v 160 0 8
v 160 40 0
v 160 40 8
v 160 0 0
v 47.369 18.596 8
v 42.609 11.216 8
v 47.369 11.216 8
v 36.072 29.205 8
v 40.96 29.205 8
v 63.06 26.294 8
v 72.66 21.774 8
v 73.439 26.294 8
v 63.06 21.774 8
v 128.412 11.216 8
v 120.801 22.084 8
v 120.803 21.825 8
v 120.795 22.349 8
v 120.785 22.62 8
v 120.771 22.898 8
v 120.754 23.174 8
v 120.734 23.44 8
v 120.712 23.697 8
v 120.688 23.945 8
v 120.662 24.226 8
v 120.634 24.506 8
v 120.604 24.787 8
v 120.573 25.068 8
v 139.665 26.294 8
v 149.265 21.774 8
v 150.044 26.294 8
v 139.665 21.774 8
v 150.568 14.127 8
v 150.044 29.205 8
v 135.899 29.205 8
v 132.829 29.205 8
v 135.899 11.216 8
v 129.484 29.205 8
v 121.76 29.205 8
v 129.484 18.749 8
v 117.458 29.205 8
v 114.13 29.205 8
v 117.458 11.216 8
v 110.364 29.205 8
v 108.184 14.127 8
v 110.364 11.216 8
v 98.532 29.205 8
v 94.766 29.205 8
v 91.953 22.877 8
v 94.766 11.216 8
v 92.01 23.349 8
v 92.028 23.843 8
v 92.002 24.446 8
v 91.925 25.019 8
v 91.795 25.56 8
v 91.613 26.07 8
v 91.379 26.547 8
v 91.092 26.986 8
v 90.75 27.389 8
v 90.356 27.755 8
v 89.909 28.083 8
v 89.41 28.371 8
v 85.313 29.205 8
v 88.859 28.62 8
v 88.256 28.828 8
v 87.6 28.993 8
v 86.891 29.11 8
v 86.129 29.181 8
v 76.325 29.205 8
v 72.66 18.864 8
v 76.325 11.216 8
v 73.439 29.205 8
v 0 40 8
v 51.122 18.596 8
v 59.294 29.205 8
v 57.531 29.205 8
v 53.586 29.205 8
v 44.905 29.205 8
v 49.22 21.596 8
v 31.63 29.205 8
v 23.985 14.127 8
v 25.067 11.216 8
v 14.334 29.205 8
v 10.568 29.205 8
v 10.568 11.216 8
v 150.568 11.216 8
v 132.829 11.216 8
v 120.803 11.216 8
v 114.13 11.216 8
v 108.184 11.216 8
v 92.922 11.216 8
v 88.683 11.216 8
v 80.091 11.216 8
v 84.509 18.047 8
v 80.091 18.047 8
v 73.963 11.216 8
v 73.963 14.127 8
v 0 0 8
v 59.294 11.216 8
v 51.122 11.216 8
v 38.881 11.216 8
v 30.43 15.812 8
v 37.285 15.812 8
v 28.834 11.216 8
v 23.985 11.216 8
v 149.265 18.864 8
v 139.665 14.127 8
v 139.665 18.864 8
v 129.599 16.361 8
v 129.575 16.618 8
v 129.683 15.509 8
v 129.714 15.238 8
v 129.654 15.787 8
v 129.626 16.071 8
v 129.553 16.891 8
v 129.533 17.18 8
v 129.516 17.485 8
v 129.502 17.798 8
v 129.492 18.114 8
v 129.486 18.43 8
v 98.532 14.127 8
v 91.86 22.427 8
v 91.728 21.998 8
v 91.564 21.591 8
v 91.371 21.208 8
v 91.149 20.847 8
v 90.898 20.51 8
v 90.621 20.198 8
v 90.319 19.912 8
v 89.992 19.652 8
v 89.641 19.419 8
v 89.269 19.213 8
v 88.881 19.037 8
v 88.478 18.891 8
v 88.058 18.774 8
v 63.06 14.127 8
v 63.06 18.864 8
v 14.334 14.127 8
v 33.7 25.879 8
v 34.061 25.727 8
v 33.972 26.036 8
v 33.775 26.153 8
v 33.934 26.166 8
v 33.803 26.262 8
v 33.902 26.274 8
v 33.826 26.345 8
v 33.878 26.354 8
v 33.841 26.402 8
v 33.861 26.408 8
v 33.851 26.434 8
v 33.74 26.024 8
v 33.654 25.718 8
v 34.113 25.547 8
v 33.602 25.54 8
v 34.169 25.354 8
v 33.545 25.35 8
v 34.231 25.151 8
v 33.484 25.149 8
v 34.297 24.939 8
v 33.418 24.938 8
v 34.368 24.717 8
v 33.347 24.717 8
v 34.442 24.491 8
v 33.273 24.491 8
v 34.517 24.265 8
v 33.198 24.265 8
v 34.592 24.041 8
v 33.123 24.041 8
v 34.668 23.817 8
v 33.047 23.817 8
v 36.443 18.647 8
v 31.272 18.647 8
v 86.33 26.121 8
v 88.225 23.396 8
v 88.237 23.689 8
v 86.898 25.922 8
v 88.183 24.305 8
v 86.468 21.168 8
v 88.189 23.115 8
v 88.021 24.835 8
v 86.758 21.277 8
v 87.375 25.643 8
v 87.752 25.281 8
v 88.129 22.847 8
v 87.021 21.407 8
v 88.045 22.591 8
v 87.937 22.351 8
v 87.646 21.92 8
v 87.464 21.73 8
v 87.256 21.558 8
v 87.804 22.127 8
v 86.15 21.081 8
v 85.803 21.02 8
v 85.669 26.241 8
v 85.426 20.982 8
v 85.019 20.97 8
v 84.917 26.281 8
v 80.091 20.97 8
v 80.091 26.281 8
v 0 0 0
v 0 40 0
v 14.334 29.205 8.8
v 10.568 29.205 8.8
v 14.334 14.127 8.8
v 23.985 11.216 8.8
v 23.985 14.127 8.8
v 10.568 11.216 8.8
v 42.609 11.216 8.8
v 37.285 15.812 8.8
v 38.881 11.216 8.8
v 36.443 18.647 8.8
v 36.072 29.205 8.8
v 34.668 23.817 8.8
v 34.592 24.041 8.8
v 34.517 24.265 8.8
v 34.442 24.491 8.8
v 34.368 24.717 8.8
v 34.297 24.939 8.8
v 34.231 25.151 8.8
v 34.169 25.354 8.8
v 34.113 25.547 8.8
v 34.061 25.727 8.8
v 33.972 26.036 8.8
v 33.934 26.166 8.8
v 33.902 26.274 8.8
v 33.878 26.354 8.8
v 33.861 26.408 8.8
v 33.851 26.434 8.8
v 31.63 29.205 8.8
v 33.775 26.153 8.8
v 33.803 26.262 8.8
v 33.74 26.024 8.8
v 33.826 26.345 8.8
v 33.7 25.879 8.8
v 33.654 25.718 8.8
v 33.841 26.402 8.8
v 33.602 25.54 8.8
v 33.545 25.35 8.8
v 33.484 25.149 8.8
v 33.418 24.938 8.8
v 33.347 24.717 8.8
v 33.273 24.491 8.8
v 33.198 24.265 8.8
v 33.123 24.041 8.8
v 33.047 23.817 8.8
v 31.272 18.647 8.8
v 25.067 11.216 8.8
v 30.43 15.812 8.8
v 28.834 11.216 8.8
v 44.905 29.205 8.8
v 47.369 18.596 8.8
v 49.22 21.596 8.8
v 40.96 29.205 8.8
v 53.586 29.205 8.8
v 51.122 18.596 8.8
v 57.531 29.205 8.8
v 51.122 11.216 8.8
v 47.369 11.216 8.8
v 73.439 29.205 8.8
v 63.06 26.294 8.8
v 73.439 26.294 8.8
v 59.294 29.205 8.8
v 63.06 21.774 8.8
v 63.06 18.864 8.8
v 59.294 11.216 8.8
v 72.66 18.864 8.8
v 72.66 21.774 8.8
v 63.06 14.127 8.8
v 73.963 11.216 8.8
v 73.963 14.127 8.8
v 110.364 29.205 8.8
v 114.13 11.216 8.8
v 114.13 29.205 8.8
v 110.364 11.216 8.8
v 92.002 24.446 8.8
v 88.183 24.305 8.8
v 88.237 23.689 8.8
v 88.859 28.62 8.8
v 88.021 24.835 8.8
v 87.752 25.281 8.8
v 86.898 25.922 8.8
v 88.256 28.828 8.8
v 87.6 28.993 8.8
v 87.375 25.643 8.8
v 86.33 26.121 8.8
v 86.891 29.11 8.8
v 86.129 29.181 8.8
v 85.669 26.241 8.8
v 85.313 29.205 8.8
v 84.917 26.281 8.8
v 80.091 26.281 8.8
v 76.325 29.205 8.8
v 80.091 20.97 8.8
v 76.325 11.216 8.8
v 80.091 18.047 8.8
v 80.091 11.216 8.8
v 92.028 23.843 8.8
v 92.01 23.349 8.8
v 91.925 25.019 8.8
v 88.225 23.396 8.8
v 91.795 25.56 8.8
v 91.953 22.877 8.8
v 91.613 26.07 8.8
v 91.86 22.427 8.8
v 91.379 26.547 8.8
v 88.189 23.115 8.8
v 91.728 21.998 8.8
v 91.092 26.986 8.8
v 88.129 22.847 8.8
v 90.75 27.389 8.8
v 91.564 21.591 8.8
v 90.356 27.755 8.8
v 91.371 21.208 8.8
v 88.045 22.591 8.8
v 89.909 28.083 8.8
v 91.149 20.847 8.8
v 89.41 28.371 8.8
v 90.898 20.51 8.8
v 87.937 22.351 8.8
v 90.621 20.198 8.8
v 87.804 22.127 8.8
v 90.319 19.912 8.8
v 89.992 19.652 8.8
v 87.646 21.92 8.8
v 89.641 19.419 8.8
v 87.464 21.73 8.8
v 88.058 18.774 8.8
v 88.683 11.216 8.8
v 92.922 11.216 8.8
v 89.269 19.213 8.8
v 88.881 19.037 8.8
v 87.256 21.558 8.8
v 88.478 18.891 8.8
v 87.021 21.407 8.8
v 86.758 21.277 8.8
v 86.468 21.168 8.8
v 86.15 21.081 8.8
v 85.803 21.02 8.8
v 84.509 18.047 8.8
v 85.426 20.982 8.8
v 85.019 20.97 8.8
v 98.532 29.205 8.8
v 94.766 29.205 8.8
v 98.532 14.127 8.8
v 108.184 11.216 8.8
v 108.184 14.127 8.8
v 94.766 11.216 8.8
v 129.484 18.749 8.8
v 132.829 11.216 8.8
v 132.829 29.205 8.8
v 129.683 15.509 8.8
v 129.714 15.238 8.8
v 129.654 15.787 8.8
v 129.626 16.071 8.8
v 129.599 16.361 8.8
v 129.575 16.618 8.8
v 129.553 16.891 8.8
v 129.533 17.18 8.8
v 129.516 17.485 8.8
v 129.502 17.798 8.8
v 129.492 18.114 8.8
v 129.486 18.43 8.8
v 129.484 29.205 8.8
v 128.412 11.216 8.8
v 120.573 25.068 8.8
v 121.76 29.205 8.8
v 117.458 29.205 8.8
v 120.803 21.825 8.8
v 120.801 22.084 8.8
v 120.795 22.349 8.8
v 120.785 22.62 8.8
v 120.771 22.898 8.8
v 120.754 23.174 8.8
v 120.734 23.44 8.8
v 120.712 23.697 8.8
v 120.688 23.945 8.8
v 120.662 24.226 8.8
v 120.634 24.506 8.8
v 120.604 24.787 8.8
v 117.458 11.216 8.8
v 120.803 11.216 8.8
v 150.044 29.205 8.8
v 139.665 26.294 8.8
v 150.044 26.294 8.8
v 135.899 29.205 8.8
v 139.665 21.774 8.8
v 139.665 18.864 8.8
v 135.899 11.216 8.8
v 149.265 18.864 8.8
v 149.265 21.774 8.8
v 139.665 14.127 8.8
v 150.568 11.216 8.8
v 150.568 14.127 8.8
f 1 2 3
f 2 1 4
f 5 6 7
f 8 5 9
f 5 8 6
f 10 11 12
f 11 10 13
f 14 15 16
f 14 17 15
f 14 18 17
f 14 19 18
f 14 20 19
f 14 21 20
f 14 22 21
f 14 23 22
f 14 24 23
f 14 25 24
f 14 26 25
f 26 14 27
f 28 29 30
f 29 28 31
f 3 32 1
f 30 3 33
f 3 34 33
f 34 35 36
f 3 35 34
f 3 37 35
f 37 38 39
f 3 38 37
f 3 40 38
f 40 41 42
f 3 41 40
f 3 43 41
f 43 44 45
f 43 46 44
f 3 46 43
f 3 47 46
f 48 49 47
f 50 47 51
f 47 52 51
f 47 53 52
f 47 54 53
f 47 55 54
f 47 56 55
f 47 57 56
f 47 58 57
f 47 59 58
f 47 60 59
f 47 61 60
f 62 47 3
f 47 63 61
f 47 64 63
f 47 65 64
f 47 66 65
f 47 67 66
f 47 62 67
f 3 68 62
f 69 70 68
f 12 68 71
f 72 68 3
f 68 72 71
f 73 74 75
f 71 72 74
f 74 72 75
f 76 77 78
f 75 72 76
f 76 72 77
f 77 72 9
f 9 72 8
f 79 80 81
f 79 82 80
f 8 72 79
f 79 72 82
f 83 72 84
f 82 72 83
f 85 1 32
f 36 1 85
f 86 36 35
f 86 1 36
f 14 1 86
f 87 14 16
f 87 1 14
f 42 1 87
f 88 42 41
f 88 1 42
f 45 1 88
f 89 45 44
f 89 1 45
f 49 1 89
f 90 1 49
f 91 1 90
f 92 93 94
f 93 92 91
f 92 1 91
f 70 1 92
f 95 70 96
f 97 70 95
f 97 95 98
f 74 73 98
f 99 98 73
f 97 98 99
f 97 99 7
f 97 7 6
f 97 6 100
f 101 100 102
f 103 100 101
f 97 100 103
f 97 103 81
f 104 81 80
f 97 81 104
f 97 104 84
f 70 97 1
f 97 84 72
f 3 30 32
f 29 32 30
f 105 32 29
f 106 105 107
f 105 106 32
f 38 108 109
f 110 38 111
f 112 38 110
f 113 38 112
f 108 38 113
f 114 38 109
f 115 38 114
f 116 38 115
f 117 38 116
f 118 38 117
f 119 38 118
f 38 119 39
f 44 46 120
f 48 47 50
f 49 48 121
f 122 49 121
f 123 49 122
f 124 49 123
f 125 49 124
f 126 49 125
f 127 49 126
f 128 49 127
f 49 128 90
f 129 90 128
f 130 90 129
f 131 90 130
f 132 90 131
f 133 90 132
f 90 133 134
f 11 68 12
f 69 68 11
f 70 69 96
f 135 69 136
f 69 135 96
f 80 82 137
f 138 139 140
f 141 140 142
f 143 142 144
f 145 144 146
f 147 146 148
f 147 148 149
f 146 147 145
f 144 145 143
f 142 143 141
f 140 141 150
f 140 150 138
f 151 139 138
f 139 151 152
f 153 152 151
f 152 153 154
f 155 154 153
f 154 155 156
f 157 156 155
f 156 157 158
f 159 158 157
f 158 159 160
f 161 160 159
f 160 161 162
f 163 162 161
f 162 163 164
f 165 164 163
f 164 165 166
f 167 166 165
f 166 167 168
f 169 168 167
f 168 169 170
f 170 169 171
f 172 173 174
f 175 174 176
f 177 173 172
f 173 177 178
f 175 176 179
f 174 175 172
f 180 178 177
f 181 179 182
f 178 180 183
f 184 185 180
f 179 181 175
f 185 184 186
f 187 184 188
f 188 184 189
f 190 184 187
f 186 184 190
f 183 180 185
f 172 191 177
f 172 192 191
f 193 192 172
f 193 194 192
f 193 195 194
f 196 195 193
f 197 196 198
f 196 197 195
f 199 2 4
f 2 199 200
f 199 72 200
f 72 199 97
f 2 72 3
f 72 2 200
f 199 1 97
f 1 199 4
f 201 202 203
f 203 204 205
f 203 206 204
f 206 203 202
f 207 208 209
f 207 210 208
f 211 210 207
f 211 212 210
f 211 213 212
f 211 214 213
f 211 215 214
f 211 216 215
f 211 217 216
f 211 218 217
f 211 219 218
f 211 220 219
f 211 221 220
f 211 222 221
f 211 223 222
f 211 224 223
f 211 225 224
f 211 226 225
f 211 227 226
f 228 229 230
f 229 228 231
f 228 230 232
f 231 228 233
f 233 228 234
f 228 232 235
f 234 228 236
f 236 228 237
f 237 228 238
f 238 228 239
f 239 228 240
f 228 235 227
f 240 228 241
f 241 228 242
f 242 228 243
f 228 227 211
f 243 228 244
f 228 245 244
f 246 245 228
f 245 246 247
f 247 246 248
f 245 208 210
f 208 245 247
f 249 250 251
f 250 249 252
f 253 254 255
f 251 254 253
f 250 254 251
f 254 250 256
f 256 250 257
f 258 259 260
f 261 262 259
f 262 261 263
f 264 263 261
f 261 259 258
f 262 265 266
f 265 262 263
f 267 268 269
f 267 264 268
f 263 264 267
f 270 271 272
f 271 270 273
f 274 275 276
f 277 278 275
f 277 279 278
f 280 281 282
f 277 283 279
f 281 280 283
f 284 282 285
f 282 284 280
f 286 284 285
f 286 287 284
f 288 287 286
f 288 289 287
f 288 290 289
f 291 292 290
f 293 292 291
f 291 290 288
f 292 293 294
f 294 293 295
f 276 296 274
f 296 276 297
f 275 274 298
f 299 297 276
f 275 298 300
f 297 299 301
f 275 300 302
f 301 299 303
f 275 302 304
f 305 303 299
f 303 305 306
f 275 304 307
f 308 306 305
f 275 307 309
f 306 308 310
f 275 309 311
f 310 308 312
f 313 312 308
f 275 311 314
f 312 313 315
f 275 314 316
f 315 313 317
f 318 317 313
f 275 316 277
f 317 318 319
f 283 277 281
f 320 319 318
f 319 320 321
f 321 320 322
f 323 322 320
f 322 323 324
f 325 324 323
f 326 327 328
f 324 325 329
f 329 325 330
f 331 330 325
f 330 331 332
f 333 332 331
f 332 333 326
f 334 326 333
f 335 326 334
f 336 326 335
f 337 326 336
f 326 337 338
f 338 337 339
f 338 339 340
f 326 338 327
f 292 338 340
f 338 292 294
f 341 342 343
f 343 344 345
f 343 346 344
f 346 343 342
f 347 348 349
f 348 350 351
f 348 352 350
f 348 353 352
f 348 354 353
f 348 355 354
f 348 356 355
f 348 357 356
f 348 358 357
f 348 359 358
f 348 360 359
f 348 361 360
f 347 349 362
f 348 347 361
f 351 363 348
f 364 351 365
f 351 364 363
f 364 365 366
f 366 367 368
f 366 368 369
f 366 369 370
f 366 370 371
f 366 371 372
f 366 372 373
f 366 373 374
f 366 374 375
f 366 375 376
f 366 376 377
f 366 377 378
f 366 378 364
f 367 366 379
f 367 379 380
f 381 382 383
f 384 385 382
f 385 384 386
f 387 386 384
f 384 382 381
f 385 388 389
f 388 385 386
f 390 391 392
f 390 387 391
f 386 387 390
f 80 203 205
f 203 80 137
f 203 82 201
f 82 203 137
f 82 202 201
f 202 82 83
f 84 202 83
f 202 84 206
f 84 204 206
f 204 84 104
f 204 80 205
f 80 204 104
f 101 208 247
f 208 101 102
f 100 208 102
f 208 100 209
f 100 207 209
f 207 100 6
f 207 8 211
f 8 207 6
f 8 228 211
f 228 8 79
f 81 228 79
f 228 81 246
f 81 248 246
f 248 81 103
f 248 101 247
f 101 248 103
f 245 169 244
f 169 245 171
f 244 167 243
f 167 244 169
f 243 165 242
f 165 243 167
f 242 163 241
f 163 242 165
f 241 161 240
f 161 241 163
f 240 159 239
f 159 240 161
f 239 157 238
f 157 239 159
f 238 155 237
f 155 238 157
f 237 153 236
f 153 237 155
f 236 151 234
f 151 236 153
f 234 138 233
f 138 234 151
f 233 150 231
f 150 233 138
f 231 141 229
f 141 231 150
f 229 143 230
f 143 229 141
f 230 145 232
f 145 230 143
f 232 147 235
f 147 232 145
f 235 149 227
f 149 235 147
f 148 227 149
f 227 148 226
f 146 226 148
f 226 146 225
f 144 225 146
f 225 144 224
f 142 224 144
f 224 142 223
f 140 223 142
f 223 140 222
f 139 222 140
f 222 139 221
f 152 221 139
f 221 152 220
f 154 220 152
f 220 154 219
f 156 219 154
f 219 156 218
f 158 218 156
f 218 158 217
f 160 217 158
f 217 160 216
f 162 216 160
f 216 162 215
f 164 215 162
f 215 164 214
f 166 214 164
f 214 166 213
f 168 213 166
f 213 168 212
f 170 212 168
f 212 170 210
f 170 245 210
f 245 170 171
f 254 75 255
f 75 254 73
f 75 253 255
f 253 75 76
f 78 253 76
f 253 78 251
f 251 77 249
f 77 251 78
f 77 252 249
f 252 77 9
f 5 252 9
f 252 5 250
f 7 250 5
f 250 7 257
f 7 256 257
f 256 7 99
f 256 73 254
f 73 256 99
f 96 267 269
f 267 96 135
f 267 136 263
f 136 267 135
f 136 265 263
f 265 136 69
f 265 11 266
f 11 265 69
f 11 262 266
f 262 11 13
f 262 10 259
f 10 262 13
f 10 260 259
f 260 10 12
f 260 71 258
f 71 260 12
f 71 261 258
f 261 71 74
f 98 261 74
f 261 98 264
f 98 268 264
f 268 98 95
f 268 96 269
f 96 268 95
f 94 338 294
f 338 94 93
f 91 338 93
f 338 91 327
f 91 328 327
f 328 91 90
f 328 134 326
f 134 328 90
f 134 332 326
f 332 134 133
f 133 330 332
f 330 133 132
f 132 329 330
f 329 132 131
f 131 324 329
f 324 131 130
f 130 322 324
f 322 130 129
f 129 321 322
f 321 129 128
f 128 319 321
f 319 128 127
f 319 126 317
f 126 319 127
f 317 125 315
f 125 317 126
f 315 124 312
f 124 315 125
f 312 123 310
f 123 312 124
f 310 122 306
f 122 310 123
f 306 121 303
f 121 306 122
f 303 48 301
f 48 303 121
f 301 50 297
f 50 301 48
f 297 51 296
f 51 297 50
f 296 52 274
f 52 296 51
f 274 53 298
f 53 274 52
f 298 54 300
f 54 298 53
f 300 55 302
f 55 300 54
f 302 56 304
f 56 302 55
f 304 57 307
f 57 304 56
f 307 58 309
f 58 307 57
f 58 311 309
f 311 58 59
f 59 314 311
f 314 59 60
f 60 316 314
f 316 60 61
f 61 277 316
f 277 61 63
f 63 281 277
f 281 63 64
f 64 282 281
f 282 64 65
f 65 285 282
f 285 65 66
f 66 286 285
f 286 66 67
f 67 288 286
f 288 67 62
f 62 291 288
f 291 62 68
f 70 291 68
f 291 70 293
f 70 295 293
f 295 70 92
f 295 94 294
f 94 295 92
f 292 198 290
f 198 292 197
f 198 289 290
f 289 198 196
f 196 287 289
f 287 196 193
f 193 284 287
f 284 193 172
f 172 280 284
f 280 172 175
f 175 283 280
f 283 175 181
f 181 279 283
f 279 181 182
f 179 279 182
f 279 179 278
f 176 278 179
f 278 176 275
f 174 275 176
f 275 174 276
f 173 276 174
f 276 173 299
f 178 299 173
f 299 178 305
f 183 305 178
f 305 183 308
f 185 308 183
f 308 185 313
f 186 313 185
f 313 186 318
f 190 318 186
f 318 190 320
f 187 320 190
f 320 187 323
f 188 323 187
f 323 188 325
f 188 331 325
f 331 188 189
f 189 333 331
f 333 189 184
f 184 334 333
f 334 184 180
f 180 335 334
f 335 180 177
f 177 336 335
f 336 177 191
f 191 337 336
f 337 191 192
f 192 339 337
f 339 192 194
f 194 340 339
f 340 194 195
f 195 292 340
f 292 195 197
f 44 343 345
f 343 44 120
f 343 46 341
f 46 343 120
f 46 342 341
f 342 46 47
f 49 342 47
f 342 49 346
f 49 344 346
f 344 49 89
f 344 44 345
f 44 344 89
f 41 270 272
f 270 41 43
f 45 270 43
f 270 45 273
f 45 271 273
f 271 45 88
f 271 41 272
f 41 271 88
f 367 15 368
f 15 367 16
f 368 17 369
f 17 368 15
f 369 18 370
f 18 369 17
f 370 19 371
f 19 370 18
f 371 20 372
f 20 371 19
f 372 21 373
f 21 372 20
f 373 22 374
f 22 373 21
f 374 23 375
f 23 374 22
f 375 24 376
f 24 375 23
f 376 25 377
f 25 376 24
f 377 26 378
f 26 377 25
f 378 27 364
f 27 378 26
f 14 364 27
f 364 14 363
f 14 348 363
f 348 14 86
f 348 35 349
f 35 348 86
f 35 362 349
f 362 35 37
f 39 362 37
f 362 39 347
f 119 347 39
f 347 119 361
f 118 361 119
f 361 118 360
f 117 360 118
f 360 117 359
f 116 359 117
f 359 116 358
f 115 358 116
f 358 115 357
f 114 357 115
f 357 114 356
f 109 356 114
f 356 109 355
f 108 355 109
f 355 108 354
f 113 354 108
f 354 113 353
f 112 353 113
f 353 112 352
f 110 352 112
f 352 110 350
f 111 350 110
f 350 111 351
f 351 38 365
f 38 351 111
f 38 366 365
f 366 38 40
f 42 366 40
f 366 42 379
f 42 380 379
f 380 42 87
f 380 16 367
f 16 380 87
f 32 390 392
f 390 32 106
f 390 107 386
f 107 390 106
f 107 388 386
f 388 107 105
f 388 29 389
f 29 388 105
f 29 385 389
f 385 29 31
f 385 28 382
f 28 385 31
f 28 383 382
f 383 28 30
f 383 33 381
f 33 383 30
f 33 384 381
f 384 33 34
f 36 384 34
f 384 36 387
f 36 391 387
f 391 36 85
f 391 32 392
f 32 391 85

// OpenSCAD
// Original Layerline prototype; adult desk decor. Millimetres.
name="LAYERLINE"; width=160; depth=40; base=8;
union(){cube([width,depth,base]);translate([width/2,depth/2,base])linear_extrude(.8)resize([width-20,0],auto=true)text(name,size=15,halign="center",valign="center",font="Liberation Sans:style=Bold");}
